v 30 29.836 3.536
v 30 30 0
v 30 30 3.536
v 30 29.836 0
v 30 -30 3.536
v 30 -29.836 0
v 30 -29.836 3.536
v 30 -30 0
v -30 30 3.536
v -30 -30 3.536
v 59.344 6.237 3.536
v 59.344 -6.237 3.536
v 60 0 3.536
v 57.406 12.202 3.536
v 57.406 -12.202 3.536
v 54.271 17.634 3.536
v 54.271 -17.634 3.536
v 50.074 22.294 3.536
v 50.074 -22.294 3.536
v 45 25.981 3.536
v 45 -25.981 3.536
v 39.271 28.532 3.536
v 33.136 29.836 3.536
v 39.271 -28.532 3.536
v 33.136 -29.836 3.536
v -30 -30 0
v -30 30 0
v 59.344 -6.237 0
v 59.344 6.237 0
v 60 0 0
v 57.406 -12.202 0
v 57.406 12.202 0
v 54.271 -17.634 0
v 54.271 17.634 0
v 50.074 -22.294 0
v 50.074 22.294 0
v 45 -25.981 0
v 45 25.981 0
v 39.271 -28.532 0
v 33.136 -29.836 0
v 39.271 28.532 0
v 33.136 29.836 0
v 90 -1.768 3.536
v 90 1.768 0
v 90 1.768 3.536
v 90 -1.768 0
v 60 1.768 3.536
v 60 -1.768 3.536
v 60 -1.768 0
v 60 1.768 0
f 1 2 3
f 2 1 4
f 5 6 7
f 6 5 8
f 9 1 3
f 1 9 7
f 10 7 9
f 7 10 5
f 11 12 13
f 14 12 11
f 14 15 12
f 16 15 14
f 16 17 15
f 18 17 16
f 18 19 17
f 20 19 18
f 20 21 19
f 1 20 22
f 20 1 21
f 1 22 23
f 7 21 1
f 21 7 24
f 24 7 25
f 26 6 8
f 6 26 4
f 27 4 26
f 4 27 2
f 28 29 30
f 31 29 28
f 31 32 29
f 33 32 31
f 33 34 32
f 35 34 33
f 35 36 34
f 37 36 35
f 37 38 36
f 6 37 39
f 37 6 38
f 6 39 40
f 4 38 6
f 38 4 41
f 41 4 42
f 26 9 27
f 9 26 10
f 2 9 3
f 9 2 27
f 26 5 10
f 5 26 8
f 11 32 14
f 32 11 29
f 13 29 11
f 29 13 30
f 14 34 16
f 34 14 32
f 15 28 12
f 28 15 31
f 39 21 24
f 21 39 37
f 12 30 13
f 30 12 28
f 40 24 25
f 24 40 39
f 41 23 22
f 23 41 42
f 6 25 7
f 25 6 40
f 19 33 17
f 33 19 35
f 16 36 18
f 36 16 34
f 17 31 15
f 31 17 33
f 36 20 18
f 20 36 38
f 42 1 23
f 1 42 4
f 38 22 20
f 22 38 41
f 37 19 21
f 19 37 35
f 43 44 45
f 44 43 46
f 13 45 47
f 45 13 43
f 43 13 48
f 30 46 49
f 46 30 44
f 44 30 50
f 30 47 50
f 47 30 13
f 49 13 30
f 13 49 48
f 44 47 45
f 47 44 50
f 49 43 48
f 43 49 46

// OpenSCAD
shaft_diameter = 12;
vane_head_diameter = 20;

tail_side = 60;
tail_height = 5/sqrt(2);

module tail(){
    union(){
        {cube([tail_side, tail_side, tail_height], center=true);}
        translate([tail_side/2, 0, 0]) {cylinder(tail_height, d=tail_side, center=true);}
        translate([tail_side+vane_head_diameter*1.5/2, 0]) {cube([vane_head_diameter*1.5, tail_height, tail_height], center=true);}
        }
    }
    
 translate([0,0,tail_height/2]) tail();
